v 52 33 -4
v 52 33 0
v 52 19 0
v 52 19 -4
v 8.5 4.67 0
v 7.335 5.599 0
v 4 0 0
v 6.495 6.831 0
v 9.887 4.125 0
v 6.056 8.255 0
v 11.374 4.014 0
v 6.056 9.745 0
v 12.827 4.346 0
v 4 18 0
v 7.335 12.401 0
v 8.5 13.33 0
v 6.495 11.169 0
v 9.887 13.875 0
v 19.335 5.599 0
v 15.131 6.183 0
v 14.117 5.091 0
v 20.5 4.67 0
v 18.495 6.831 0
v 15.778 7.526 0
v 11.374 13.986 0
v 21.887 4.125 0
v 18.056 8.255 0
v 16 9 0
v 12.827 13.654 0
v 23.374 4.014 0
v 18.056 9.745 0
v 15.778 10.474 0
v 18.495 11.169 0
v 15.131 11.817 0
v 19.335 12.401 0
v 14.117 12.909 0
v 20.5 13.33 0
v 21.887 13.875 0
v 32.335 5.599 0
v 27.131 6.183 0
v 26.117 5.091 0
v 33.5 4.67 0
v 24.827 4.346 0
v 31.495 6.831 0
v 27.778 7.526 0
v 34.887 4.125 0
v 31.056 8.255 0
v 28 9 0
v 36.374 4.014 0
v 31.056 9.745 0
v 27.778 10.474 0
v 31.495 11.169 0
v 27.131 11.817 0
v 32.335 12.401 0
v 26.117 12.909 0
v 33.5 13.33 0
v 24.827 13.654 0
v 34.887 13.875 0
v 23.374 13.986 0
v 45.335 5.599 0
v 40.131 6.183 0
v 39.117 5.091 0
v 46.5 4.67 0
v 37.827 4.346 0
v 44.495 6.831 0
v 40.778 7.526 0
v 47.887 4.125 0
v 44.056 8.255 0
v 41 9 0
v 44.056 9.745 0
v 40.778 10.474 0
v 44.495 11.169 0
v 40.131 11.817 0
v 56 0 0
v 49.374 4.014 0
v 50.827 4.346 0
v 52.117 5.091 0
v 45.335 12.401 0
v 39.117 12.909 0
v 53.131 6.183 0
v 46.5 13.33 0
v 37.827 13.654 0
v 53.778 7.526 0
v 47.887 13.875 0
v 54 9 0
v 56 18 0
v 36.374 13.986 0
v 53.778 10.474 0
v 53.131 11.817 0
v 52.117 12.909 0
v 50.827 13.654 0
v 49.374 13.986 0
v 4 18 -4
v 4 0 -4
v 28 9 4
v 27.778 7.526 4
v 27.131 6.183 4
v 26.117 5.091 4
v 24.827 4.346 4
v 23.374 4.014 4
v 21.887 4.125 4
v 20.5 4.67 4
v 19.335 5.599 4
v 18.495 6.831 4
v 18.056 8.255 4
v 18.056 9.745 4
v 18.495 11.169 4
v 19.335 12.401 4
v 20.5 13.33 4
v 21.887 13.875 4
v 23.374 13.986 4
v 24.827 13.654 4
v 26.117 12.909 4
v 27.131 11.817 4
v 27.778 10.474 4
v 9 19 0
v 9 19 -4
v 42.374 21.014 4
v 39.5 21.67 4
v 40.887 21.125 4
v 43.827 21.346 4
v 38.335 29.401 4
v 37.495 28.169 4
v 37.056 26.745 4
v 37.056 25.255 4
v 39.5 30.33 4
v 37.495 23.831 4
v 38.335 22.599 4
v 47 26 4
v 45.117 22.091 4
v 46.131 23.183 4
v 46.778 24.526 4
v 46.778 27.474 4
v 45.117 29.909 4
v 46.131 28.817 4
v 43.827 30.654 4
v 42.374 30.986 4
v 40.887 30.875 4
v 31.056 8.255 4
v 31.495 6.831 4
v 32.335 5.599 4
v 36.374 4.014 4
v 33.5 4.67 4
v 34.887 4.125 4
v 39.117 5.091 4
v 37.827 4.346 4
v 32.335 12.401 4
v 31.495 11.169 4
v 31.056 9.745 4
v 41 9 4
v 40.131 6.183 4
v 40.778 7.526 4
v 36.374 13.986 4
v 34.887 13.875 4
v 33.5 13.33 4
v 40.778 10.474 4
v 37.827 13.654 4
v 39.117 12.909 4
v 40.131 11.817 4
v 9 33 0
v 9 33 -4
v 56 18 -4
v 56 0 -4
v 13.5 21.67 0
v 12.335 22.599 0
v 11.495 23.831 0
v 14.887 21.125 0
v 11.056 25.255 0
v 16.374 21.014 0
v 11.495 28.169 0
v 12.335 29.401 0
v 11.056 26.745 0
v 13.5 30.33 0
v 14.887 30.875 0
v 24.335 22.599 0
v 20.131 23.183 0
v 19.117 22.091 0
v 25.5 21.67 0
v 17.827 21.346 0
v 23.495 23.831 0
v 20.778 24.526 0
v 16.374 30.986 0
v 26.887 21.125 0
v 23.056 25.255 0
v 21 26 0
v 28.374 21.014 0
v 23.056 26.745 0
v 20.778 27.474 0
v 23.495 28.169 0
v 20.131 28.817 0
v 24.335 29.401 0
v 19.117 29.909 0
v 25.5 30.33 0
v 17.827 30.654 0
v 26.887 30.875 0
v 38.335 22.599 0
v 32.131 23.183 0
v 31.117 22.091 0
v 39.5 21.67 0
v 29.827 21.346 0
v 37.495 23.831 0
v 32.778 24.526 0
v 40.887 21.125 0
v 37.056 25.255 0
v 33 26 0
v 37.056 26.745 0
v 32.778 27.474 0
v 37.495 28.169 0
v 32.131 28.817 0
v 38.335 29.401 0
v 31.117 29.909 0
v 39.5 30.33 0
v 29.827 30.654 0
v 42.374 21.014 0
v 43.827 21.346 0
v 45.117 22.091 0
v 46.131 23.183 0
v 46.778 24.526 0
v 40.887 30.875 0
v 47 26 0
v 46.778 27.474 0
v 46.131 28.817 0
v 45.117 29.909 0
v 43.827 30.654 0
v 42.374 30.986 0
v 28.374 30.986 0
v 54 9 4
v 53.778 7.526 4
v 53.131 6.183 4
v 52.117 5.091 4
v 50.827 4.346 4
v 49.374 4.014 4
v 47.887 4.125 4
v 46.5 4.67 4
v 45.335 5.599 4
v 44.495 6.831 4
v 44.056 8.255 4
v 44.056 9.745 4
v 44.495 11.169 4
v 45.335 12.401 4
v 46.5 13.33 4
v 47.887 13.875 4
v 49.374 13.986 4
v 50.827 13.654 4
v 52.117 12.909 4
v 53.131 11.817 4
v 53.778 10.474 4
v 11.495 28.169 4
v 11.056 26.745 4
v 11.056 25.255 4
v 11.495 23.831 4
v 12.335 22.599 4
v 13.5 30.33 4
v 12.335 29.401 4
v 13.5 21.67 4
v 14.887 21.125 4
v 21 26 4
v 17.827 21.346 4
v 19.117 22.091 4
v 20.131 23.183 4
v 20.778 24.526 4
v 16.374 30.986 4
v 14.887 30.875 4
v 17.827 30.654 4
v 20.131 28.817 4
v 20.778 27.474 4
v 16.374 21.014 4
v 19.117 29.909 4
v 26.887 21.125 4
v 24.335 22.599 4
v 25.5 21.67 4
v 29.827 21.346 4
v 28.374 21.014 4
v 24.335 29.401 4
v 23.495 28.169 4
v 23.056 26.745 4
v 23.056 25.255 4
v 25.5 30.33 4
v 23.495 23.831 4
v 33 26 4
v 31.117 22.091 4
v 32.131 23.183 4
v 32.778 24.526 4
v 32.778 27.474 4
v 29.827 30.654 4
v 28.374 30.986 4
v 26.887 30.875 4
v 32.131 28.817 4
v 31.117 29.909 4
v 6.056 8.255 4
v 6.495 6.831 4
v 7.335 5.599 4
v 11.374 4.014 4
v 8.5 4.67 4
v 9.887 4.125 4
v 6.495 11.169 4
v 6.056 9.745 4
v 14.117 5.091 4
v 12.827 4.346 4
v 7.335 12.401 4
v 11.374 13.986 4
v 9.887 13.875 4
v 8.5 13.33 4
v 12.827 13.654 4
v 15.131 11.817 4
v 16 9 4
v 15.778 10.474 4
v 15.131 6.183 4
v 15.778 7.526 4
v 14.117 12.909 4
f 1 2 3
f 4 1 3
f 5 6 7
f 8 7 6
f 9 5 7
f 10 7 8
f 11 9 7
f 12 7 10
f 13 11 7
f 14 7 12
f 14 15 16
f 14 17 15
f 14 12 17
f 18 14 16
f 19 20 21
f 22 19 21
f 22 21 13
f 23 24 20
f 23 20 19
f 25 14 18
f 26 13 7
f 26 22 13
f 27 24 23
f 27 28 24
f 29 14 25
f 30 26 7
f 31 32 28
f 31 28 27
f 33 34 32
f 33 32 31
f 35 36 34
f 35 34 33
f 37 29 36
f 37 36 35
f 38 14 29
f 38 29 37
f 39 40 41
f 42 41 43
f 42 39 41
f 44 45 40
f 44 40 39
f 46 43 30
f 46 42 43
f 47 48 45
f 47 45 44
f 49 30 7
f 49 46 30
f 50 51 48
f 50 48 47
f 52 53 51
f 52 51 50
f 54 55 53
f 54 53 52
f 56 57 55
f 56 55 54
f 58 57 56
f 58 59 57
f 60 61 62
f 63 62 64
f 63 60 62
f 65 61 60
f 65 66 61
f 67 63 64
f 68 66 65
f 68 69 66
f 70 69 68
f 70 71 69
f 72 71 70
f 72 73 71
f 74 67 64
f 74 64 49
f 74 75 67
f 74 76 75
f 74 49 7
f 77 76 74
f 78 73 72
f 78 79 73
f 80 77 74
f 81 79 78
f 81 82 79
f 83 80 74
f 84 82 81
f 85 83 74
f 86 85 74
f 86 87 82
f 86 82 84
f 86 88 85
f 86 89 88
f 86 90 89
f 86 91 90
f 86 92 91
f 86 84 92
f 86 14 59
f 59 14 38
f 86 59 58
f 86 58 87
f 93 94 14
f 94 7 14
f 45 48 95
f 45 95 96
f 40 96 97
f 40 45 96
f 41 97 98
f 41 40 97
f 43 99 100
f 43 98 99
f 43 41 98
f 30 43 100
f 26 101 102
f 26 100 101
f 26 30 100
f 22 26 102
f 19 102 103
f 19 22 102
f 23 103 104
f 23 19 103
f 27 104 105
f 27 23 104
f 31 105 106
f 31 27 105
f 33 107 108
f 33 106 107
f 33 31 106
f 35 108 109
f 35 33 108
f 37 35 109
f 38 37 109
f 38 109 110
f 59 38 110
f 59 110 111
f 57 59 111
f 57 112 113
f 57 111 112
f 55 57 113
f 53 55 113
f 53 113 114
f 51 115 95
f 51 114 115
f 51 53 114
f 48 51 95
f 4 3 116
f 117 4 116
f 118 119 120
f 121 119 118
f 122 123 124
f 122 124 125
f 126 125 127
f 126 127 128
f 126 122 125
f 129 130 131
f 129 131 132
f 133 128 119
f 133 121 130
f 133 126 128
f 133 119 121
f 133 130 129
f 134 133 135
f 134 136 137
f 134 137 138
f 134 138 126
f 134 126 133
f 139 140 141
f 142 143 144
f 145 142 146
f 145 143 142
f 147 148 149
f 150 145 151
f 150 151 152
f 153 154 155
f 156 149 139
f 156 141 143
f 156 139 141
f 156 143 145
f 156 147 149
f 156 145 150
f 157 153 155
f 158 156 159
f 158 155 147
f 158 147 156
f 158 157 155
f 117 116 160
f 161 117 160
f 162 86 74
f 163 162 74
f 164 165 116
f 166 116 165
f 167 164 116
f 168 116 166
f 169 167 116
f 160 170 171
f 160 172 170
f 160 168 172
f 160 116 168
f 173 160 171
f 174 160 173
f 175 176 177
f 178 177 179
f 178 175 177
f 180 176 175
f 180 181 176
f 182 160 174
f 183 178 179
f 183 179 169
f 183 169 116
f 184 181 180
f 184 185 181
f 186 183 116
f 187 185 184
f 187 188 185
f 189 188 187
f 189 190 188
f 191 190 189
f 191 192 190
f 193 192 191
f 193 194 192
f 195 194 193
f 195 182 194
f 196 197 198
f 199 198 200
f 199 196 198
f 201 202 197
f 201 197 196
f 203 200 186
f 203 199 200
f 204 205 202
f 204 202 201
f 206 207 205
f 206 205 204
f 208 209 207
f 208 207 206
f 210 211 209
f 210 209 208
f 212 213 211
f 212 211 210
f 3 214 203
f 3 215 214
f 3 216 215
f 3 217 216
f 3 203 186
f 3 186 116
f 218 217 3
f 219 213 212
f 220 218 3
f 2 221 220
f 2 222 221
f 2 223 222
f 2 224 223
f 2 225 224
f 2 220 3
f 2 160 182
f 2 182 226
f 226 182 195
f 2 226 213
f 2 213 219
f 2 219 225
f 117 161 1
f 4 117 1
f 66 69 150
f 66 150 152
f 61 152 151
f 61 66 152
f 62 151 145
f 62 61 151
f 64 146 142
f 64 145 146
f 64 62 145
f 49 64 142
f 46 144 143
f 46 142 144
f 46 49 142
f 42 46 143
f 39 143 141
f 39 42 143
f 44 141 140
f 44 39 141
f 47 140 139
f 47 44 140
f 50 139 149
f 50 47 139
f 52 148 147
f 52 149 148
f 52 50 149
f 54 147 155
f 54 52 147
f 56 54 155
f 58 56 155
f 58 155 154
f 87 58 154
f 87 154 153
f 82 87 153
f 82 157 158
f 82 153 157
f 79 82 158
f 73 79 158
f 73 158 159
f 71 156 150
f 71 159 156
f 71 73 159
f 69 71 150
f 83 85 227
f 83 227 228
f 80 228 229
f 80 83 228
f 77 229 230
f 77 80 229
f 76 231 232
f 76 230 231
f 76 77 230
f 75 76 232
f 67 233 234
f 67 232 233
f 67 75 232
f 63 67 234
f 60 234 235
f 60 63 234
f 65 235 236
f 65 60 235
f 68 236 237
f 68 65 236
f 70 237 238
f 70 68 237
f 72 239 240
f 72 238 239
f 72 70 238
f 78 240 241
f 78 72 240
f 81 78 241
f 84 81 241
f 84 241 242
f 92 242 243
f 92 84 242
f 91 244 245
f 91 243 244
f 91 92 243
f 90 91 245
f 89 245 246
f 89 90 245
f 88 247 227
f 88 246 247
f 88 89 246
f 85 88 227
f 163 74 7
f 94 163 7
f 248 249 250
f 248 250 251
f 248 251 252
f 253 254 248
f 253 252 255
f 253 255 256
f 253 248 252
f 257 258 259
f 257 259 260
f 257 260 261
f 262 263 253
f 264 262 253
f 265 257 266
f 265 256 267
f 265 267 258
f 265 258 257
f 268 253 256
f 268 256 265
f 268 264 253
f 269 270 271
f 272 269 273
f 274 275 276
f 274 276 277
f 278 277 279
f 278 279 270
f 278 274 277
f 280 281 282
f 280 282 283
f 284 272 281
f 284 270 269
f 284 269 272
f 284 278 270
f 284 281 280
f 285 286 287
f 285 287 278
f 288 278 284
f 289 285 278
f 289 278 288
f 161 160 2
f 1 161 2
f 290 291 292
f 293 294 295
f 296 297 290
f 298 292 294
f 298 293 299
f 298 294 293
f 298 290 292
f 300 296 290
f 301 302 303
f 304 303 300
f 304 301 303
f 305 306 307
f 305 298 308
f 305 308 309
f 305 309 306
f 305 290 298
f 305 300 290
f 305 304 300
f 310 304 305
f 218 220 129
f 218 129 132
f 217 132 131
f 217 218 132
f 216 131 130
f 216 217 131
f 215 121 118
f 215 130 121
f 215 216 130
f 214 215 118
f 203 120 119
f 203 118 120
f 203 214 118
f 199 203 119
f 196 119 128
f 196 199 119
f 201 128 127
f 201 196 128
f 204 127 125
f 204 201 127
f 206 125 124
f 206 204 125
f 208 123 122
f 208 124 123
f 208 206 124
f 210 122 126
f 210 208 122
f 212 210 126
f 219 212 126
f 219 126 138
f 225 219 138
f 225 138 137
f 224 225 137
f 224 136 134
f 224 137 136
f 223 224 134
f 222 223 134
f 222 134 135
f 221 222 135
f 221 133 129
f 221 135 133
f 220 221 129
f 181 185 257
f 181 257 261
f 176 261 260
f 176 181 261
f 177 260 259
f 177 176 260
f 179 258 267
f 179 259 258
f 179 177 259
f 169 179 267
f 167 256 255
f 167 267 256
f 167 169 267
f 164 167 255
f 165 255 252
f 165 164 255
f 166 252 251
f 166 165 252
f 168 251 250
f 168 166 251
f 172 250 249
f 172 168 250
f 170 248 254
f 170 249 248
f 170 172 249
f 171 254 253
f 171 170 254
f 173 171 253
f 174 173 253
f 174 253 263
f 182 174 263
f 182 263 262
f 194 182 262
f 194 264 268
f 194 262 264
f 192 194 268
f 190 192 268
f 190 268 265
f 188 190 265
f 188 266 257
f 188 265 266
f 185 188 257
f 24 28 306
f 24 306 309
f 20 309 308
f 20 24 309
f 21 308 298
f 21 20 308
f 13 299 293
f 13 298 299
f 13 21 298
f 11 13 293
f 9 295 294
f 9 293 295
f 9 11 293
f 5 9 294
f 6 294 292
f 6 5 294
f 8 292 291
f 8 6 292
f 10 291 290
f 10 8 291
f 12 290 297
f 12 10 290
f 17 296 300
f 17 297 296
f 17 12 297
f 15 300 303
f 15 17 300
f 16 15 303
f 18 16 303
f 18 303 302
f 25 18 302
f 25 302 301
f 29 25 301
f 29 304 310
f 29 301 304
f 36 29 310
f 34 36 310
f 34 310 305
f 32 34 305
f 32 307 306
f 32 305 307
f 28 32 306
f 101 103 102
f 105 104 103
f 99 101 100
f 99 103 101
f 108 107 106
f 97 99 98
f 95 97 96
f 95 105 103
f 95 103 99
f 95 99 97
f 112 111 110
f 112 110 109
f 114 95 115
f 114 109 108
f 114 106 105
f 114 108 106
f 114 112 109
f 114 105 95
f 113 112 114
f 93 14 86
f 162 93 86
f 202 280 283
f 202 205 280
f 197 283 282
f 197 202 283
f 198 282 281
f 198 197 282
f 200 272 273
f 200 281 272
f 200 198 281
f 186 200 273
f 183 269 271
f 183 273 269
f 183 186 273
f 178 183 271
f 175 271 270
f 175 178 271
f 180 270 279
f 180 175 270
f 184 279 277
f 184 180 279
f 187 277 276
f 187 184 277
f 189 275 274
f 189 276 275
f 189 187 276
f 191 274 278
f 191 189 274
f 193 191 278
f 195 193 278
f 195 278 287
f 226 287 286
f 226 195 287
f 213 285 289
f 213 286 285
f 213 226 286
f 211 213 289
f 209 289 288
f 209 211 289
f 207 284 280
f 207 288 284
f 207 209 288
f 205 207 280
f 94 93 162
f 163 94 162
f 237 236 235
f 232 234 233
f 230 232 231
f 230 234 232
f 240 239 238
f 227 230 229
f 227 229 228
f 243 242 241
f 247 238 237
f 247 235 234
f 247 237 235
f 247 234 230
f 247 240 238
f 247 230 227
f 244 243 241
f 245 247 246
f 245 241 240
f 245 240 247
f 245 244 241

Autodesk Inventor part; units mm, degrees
ref_plane "YZ Plane" through (0, 0, 0) normal (1, 0, 0) x (0, 1, 0)
ref_plane "XZ Plane" through (0, 0, 0) normal (0, 1, 0) x (-1, 0, 0)
ref_plane "XY Plane" through (0, 0, 0) normal (0, 0, 1) x (1, 0, 0)
sketch "Sketch1" plane through (0, 0, 0) normal (0, 0, 1) x (1, 0, 0)
  line L0 (4, 18) -> (56, 18)
  line L1 (56, 18) -> (56, 0)
  line L2 (56, 0) -> (4, 0)
  line L3 (4, 0) -> (4, 18)
  point P0 (0, 0)
extrude "Extrusion1" add sketch "Sketch1" against normal blind 4
sketch "Sketch2" plane through (0, 0, 0) normal (0, 0, 1) x (1, 0, 0)
  circle A0 centre (11, 9) radius 5
  circle A1 centre (23, 9) radius 5
  circle A2 centre (36, 9) radius 5
  circle A3 centre (49, 9) radius 5
  point P0 (0, 0)
sketch "Sketch3" plane through (0, 0, 0) normal (0, 0, 1) x (1, 0, 0)
  line L0 (9, 33) -> (52, 33)
  line L1 (52, 33) -> (52, 19)
  line L2 (52, 19) -> (9, 19)
  line L3 (9, 19) -> (9, 33)
  point P0 (0, 0)
extrude "Extrusion2" add sketch "Sketch3" against normal blind 4
sketch "Sketch4" plane through (0, 0, 0) normal (0, 0, 1) x (1, 0, 0)
  circle A0 centre (16, 26) radius 5
  circle A1 centre (28, 26) radius 5
  circle A2 centre (42, 26) radius 5
  point P0 (0, 0)
extrude "Extrusion3" add sketch "Sketch2" along normal blind 4
extrude "Extrusion4" add sketch "Sketch4" along normal blind 4
properties part number "Push Buttons"
